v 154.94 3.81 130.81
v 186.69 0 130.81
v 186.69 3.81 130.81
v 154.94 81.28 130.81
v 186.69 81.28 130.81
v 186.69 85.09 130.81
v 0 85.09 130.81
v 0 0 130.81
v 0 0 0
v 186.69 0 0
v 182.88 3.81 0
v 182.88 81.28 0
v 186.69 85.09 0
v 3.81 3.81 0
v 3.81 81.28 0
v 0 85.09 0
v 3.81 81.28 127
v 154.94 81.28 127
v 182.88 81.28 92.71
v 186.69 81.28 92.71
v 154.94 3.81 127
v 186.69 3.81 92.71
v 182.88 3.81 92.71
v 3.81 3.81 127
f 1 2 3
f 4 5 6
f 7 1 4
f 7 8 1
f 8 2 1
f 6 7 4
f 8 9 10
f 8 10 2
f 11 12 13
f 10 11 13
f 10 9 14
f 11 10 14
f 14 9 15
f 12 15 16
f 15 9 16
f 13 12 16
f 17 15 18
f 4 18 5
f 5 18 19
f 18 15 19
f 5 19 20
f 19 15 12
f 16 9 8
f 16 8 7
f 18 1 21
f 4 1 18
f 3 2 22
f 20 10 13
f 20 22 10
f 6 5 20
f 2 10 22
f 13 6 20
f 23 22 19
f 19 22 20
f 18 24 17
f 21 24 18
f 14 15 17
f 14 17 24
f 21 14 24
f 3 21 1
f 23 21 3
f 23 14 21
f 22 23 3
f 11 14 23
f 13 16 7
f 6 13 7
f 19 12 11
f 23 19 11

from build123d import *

# Parameters (mm, degrees)
SKETCH1_W           = 85.09
SKETCH1_H           = 130.81
BOSS_EXTRUDE1_DEPTH = 186.69
SKETCH3_W           = 77.47
SKETCH3_H           = 38.1
CUT_EXTRUDE3_DEPTH  = 31.75
SKETCH4_W           = 179.07
SKETCH4_H           = 77.47
CUT_EXTRUDE4_DEPTH  = 127


with BuildPart() as part:
    # Sketch1 → Boss-Extrude1 (new body)
    with BuildSketch(Plane.YZ):
        with Locations((42.545, 65.405)):
            Rectangle(SKETCH1_W, SKETCH1_H)
    extrude(amount=BOSS_EXTRUDE1_DEPTH)

    # Sketch3 → Cut-Extrude3 (cut)
    with BuildSketch(Plane.YZ.offset(186.69)):
        with Locations((42.545, 111.76)):
            Rectangle(SKETCH3_W, SKETCH3_H)
    extrude(amount=-CUT_EXTRUDE3_DEPTH, mode=Mode.SUBTRACT)

    # Sketch4 → Cut-Extrude4 (cut)
    with BuildSketch(Plane(origin=(0, 0, 0), x_dir=(1, 0, 0), z_dir=(0, 0, -1))):
        with Locations((93.345, -42.545)):
            Rectangle(SKETCH4_W, SKETCH4_H)
    extrude(amount=-CUT_EXTRUDE4_DEPTH, mode=Mode.SUBTRACT)


solid = part.part
